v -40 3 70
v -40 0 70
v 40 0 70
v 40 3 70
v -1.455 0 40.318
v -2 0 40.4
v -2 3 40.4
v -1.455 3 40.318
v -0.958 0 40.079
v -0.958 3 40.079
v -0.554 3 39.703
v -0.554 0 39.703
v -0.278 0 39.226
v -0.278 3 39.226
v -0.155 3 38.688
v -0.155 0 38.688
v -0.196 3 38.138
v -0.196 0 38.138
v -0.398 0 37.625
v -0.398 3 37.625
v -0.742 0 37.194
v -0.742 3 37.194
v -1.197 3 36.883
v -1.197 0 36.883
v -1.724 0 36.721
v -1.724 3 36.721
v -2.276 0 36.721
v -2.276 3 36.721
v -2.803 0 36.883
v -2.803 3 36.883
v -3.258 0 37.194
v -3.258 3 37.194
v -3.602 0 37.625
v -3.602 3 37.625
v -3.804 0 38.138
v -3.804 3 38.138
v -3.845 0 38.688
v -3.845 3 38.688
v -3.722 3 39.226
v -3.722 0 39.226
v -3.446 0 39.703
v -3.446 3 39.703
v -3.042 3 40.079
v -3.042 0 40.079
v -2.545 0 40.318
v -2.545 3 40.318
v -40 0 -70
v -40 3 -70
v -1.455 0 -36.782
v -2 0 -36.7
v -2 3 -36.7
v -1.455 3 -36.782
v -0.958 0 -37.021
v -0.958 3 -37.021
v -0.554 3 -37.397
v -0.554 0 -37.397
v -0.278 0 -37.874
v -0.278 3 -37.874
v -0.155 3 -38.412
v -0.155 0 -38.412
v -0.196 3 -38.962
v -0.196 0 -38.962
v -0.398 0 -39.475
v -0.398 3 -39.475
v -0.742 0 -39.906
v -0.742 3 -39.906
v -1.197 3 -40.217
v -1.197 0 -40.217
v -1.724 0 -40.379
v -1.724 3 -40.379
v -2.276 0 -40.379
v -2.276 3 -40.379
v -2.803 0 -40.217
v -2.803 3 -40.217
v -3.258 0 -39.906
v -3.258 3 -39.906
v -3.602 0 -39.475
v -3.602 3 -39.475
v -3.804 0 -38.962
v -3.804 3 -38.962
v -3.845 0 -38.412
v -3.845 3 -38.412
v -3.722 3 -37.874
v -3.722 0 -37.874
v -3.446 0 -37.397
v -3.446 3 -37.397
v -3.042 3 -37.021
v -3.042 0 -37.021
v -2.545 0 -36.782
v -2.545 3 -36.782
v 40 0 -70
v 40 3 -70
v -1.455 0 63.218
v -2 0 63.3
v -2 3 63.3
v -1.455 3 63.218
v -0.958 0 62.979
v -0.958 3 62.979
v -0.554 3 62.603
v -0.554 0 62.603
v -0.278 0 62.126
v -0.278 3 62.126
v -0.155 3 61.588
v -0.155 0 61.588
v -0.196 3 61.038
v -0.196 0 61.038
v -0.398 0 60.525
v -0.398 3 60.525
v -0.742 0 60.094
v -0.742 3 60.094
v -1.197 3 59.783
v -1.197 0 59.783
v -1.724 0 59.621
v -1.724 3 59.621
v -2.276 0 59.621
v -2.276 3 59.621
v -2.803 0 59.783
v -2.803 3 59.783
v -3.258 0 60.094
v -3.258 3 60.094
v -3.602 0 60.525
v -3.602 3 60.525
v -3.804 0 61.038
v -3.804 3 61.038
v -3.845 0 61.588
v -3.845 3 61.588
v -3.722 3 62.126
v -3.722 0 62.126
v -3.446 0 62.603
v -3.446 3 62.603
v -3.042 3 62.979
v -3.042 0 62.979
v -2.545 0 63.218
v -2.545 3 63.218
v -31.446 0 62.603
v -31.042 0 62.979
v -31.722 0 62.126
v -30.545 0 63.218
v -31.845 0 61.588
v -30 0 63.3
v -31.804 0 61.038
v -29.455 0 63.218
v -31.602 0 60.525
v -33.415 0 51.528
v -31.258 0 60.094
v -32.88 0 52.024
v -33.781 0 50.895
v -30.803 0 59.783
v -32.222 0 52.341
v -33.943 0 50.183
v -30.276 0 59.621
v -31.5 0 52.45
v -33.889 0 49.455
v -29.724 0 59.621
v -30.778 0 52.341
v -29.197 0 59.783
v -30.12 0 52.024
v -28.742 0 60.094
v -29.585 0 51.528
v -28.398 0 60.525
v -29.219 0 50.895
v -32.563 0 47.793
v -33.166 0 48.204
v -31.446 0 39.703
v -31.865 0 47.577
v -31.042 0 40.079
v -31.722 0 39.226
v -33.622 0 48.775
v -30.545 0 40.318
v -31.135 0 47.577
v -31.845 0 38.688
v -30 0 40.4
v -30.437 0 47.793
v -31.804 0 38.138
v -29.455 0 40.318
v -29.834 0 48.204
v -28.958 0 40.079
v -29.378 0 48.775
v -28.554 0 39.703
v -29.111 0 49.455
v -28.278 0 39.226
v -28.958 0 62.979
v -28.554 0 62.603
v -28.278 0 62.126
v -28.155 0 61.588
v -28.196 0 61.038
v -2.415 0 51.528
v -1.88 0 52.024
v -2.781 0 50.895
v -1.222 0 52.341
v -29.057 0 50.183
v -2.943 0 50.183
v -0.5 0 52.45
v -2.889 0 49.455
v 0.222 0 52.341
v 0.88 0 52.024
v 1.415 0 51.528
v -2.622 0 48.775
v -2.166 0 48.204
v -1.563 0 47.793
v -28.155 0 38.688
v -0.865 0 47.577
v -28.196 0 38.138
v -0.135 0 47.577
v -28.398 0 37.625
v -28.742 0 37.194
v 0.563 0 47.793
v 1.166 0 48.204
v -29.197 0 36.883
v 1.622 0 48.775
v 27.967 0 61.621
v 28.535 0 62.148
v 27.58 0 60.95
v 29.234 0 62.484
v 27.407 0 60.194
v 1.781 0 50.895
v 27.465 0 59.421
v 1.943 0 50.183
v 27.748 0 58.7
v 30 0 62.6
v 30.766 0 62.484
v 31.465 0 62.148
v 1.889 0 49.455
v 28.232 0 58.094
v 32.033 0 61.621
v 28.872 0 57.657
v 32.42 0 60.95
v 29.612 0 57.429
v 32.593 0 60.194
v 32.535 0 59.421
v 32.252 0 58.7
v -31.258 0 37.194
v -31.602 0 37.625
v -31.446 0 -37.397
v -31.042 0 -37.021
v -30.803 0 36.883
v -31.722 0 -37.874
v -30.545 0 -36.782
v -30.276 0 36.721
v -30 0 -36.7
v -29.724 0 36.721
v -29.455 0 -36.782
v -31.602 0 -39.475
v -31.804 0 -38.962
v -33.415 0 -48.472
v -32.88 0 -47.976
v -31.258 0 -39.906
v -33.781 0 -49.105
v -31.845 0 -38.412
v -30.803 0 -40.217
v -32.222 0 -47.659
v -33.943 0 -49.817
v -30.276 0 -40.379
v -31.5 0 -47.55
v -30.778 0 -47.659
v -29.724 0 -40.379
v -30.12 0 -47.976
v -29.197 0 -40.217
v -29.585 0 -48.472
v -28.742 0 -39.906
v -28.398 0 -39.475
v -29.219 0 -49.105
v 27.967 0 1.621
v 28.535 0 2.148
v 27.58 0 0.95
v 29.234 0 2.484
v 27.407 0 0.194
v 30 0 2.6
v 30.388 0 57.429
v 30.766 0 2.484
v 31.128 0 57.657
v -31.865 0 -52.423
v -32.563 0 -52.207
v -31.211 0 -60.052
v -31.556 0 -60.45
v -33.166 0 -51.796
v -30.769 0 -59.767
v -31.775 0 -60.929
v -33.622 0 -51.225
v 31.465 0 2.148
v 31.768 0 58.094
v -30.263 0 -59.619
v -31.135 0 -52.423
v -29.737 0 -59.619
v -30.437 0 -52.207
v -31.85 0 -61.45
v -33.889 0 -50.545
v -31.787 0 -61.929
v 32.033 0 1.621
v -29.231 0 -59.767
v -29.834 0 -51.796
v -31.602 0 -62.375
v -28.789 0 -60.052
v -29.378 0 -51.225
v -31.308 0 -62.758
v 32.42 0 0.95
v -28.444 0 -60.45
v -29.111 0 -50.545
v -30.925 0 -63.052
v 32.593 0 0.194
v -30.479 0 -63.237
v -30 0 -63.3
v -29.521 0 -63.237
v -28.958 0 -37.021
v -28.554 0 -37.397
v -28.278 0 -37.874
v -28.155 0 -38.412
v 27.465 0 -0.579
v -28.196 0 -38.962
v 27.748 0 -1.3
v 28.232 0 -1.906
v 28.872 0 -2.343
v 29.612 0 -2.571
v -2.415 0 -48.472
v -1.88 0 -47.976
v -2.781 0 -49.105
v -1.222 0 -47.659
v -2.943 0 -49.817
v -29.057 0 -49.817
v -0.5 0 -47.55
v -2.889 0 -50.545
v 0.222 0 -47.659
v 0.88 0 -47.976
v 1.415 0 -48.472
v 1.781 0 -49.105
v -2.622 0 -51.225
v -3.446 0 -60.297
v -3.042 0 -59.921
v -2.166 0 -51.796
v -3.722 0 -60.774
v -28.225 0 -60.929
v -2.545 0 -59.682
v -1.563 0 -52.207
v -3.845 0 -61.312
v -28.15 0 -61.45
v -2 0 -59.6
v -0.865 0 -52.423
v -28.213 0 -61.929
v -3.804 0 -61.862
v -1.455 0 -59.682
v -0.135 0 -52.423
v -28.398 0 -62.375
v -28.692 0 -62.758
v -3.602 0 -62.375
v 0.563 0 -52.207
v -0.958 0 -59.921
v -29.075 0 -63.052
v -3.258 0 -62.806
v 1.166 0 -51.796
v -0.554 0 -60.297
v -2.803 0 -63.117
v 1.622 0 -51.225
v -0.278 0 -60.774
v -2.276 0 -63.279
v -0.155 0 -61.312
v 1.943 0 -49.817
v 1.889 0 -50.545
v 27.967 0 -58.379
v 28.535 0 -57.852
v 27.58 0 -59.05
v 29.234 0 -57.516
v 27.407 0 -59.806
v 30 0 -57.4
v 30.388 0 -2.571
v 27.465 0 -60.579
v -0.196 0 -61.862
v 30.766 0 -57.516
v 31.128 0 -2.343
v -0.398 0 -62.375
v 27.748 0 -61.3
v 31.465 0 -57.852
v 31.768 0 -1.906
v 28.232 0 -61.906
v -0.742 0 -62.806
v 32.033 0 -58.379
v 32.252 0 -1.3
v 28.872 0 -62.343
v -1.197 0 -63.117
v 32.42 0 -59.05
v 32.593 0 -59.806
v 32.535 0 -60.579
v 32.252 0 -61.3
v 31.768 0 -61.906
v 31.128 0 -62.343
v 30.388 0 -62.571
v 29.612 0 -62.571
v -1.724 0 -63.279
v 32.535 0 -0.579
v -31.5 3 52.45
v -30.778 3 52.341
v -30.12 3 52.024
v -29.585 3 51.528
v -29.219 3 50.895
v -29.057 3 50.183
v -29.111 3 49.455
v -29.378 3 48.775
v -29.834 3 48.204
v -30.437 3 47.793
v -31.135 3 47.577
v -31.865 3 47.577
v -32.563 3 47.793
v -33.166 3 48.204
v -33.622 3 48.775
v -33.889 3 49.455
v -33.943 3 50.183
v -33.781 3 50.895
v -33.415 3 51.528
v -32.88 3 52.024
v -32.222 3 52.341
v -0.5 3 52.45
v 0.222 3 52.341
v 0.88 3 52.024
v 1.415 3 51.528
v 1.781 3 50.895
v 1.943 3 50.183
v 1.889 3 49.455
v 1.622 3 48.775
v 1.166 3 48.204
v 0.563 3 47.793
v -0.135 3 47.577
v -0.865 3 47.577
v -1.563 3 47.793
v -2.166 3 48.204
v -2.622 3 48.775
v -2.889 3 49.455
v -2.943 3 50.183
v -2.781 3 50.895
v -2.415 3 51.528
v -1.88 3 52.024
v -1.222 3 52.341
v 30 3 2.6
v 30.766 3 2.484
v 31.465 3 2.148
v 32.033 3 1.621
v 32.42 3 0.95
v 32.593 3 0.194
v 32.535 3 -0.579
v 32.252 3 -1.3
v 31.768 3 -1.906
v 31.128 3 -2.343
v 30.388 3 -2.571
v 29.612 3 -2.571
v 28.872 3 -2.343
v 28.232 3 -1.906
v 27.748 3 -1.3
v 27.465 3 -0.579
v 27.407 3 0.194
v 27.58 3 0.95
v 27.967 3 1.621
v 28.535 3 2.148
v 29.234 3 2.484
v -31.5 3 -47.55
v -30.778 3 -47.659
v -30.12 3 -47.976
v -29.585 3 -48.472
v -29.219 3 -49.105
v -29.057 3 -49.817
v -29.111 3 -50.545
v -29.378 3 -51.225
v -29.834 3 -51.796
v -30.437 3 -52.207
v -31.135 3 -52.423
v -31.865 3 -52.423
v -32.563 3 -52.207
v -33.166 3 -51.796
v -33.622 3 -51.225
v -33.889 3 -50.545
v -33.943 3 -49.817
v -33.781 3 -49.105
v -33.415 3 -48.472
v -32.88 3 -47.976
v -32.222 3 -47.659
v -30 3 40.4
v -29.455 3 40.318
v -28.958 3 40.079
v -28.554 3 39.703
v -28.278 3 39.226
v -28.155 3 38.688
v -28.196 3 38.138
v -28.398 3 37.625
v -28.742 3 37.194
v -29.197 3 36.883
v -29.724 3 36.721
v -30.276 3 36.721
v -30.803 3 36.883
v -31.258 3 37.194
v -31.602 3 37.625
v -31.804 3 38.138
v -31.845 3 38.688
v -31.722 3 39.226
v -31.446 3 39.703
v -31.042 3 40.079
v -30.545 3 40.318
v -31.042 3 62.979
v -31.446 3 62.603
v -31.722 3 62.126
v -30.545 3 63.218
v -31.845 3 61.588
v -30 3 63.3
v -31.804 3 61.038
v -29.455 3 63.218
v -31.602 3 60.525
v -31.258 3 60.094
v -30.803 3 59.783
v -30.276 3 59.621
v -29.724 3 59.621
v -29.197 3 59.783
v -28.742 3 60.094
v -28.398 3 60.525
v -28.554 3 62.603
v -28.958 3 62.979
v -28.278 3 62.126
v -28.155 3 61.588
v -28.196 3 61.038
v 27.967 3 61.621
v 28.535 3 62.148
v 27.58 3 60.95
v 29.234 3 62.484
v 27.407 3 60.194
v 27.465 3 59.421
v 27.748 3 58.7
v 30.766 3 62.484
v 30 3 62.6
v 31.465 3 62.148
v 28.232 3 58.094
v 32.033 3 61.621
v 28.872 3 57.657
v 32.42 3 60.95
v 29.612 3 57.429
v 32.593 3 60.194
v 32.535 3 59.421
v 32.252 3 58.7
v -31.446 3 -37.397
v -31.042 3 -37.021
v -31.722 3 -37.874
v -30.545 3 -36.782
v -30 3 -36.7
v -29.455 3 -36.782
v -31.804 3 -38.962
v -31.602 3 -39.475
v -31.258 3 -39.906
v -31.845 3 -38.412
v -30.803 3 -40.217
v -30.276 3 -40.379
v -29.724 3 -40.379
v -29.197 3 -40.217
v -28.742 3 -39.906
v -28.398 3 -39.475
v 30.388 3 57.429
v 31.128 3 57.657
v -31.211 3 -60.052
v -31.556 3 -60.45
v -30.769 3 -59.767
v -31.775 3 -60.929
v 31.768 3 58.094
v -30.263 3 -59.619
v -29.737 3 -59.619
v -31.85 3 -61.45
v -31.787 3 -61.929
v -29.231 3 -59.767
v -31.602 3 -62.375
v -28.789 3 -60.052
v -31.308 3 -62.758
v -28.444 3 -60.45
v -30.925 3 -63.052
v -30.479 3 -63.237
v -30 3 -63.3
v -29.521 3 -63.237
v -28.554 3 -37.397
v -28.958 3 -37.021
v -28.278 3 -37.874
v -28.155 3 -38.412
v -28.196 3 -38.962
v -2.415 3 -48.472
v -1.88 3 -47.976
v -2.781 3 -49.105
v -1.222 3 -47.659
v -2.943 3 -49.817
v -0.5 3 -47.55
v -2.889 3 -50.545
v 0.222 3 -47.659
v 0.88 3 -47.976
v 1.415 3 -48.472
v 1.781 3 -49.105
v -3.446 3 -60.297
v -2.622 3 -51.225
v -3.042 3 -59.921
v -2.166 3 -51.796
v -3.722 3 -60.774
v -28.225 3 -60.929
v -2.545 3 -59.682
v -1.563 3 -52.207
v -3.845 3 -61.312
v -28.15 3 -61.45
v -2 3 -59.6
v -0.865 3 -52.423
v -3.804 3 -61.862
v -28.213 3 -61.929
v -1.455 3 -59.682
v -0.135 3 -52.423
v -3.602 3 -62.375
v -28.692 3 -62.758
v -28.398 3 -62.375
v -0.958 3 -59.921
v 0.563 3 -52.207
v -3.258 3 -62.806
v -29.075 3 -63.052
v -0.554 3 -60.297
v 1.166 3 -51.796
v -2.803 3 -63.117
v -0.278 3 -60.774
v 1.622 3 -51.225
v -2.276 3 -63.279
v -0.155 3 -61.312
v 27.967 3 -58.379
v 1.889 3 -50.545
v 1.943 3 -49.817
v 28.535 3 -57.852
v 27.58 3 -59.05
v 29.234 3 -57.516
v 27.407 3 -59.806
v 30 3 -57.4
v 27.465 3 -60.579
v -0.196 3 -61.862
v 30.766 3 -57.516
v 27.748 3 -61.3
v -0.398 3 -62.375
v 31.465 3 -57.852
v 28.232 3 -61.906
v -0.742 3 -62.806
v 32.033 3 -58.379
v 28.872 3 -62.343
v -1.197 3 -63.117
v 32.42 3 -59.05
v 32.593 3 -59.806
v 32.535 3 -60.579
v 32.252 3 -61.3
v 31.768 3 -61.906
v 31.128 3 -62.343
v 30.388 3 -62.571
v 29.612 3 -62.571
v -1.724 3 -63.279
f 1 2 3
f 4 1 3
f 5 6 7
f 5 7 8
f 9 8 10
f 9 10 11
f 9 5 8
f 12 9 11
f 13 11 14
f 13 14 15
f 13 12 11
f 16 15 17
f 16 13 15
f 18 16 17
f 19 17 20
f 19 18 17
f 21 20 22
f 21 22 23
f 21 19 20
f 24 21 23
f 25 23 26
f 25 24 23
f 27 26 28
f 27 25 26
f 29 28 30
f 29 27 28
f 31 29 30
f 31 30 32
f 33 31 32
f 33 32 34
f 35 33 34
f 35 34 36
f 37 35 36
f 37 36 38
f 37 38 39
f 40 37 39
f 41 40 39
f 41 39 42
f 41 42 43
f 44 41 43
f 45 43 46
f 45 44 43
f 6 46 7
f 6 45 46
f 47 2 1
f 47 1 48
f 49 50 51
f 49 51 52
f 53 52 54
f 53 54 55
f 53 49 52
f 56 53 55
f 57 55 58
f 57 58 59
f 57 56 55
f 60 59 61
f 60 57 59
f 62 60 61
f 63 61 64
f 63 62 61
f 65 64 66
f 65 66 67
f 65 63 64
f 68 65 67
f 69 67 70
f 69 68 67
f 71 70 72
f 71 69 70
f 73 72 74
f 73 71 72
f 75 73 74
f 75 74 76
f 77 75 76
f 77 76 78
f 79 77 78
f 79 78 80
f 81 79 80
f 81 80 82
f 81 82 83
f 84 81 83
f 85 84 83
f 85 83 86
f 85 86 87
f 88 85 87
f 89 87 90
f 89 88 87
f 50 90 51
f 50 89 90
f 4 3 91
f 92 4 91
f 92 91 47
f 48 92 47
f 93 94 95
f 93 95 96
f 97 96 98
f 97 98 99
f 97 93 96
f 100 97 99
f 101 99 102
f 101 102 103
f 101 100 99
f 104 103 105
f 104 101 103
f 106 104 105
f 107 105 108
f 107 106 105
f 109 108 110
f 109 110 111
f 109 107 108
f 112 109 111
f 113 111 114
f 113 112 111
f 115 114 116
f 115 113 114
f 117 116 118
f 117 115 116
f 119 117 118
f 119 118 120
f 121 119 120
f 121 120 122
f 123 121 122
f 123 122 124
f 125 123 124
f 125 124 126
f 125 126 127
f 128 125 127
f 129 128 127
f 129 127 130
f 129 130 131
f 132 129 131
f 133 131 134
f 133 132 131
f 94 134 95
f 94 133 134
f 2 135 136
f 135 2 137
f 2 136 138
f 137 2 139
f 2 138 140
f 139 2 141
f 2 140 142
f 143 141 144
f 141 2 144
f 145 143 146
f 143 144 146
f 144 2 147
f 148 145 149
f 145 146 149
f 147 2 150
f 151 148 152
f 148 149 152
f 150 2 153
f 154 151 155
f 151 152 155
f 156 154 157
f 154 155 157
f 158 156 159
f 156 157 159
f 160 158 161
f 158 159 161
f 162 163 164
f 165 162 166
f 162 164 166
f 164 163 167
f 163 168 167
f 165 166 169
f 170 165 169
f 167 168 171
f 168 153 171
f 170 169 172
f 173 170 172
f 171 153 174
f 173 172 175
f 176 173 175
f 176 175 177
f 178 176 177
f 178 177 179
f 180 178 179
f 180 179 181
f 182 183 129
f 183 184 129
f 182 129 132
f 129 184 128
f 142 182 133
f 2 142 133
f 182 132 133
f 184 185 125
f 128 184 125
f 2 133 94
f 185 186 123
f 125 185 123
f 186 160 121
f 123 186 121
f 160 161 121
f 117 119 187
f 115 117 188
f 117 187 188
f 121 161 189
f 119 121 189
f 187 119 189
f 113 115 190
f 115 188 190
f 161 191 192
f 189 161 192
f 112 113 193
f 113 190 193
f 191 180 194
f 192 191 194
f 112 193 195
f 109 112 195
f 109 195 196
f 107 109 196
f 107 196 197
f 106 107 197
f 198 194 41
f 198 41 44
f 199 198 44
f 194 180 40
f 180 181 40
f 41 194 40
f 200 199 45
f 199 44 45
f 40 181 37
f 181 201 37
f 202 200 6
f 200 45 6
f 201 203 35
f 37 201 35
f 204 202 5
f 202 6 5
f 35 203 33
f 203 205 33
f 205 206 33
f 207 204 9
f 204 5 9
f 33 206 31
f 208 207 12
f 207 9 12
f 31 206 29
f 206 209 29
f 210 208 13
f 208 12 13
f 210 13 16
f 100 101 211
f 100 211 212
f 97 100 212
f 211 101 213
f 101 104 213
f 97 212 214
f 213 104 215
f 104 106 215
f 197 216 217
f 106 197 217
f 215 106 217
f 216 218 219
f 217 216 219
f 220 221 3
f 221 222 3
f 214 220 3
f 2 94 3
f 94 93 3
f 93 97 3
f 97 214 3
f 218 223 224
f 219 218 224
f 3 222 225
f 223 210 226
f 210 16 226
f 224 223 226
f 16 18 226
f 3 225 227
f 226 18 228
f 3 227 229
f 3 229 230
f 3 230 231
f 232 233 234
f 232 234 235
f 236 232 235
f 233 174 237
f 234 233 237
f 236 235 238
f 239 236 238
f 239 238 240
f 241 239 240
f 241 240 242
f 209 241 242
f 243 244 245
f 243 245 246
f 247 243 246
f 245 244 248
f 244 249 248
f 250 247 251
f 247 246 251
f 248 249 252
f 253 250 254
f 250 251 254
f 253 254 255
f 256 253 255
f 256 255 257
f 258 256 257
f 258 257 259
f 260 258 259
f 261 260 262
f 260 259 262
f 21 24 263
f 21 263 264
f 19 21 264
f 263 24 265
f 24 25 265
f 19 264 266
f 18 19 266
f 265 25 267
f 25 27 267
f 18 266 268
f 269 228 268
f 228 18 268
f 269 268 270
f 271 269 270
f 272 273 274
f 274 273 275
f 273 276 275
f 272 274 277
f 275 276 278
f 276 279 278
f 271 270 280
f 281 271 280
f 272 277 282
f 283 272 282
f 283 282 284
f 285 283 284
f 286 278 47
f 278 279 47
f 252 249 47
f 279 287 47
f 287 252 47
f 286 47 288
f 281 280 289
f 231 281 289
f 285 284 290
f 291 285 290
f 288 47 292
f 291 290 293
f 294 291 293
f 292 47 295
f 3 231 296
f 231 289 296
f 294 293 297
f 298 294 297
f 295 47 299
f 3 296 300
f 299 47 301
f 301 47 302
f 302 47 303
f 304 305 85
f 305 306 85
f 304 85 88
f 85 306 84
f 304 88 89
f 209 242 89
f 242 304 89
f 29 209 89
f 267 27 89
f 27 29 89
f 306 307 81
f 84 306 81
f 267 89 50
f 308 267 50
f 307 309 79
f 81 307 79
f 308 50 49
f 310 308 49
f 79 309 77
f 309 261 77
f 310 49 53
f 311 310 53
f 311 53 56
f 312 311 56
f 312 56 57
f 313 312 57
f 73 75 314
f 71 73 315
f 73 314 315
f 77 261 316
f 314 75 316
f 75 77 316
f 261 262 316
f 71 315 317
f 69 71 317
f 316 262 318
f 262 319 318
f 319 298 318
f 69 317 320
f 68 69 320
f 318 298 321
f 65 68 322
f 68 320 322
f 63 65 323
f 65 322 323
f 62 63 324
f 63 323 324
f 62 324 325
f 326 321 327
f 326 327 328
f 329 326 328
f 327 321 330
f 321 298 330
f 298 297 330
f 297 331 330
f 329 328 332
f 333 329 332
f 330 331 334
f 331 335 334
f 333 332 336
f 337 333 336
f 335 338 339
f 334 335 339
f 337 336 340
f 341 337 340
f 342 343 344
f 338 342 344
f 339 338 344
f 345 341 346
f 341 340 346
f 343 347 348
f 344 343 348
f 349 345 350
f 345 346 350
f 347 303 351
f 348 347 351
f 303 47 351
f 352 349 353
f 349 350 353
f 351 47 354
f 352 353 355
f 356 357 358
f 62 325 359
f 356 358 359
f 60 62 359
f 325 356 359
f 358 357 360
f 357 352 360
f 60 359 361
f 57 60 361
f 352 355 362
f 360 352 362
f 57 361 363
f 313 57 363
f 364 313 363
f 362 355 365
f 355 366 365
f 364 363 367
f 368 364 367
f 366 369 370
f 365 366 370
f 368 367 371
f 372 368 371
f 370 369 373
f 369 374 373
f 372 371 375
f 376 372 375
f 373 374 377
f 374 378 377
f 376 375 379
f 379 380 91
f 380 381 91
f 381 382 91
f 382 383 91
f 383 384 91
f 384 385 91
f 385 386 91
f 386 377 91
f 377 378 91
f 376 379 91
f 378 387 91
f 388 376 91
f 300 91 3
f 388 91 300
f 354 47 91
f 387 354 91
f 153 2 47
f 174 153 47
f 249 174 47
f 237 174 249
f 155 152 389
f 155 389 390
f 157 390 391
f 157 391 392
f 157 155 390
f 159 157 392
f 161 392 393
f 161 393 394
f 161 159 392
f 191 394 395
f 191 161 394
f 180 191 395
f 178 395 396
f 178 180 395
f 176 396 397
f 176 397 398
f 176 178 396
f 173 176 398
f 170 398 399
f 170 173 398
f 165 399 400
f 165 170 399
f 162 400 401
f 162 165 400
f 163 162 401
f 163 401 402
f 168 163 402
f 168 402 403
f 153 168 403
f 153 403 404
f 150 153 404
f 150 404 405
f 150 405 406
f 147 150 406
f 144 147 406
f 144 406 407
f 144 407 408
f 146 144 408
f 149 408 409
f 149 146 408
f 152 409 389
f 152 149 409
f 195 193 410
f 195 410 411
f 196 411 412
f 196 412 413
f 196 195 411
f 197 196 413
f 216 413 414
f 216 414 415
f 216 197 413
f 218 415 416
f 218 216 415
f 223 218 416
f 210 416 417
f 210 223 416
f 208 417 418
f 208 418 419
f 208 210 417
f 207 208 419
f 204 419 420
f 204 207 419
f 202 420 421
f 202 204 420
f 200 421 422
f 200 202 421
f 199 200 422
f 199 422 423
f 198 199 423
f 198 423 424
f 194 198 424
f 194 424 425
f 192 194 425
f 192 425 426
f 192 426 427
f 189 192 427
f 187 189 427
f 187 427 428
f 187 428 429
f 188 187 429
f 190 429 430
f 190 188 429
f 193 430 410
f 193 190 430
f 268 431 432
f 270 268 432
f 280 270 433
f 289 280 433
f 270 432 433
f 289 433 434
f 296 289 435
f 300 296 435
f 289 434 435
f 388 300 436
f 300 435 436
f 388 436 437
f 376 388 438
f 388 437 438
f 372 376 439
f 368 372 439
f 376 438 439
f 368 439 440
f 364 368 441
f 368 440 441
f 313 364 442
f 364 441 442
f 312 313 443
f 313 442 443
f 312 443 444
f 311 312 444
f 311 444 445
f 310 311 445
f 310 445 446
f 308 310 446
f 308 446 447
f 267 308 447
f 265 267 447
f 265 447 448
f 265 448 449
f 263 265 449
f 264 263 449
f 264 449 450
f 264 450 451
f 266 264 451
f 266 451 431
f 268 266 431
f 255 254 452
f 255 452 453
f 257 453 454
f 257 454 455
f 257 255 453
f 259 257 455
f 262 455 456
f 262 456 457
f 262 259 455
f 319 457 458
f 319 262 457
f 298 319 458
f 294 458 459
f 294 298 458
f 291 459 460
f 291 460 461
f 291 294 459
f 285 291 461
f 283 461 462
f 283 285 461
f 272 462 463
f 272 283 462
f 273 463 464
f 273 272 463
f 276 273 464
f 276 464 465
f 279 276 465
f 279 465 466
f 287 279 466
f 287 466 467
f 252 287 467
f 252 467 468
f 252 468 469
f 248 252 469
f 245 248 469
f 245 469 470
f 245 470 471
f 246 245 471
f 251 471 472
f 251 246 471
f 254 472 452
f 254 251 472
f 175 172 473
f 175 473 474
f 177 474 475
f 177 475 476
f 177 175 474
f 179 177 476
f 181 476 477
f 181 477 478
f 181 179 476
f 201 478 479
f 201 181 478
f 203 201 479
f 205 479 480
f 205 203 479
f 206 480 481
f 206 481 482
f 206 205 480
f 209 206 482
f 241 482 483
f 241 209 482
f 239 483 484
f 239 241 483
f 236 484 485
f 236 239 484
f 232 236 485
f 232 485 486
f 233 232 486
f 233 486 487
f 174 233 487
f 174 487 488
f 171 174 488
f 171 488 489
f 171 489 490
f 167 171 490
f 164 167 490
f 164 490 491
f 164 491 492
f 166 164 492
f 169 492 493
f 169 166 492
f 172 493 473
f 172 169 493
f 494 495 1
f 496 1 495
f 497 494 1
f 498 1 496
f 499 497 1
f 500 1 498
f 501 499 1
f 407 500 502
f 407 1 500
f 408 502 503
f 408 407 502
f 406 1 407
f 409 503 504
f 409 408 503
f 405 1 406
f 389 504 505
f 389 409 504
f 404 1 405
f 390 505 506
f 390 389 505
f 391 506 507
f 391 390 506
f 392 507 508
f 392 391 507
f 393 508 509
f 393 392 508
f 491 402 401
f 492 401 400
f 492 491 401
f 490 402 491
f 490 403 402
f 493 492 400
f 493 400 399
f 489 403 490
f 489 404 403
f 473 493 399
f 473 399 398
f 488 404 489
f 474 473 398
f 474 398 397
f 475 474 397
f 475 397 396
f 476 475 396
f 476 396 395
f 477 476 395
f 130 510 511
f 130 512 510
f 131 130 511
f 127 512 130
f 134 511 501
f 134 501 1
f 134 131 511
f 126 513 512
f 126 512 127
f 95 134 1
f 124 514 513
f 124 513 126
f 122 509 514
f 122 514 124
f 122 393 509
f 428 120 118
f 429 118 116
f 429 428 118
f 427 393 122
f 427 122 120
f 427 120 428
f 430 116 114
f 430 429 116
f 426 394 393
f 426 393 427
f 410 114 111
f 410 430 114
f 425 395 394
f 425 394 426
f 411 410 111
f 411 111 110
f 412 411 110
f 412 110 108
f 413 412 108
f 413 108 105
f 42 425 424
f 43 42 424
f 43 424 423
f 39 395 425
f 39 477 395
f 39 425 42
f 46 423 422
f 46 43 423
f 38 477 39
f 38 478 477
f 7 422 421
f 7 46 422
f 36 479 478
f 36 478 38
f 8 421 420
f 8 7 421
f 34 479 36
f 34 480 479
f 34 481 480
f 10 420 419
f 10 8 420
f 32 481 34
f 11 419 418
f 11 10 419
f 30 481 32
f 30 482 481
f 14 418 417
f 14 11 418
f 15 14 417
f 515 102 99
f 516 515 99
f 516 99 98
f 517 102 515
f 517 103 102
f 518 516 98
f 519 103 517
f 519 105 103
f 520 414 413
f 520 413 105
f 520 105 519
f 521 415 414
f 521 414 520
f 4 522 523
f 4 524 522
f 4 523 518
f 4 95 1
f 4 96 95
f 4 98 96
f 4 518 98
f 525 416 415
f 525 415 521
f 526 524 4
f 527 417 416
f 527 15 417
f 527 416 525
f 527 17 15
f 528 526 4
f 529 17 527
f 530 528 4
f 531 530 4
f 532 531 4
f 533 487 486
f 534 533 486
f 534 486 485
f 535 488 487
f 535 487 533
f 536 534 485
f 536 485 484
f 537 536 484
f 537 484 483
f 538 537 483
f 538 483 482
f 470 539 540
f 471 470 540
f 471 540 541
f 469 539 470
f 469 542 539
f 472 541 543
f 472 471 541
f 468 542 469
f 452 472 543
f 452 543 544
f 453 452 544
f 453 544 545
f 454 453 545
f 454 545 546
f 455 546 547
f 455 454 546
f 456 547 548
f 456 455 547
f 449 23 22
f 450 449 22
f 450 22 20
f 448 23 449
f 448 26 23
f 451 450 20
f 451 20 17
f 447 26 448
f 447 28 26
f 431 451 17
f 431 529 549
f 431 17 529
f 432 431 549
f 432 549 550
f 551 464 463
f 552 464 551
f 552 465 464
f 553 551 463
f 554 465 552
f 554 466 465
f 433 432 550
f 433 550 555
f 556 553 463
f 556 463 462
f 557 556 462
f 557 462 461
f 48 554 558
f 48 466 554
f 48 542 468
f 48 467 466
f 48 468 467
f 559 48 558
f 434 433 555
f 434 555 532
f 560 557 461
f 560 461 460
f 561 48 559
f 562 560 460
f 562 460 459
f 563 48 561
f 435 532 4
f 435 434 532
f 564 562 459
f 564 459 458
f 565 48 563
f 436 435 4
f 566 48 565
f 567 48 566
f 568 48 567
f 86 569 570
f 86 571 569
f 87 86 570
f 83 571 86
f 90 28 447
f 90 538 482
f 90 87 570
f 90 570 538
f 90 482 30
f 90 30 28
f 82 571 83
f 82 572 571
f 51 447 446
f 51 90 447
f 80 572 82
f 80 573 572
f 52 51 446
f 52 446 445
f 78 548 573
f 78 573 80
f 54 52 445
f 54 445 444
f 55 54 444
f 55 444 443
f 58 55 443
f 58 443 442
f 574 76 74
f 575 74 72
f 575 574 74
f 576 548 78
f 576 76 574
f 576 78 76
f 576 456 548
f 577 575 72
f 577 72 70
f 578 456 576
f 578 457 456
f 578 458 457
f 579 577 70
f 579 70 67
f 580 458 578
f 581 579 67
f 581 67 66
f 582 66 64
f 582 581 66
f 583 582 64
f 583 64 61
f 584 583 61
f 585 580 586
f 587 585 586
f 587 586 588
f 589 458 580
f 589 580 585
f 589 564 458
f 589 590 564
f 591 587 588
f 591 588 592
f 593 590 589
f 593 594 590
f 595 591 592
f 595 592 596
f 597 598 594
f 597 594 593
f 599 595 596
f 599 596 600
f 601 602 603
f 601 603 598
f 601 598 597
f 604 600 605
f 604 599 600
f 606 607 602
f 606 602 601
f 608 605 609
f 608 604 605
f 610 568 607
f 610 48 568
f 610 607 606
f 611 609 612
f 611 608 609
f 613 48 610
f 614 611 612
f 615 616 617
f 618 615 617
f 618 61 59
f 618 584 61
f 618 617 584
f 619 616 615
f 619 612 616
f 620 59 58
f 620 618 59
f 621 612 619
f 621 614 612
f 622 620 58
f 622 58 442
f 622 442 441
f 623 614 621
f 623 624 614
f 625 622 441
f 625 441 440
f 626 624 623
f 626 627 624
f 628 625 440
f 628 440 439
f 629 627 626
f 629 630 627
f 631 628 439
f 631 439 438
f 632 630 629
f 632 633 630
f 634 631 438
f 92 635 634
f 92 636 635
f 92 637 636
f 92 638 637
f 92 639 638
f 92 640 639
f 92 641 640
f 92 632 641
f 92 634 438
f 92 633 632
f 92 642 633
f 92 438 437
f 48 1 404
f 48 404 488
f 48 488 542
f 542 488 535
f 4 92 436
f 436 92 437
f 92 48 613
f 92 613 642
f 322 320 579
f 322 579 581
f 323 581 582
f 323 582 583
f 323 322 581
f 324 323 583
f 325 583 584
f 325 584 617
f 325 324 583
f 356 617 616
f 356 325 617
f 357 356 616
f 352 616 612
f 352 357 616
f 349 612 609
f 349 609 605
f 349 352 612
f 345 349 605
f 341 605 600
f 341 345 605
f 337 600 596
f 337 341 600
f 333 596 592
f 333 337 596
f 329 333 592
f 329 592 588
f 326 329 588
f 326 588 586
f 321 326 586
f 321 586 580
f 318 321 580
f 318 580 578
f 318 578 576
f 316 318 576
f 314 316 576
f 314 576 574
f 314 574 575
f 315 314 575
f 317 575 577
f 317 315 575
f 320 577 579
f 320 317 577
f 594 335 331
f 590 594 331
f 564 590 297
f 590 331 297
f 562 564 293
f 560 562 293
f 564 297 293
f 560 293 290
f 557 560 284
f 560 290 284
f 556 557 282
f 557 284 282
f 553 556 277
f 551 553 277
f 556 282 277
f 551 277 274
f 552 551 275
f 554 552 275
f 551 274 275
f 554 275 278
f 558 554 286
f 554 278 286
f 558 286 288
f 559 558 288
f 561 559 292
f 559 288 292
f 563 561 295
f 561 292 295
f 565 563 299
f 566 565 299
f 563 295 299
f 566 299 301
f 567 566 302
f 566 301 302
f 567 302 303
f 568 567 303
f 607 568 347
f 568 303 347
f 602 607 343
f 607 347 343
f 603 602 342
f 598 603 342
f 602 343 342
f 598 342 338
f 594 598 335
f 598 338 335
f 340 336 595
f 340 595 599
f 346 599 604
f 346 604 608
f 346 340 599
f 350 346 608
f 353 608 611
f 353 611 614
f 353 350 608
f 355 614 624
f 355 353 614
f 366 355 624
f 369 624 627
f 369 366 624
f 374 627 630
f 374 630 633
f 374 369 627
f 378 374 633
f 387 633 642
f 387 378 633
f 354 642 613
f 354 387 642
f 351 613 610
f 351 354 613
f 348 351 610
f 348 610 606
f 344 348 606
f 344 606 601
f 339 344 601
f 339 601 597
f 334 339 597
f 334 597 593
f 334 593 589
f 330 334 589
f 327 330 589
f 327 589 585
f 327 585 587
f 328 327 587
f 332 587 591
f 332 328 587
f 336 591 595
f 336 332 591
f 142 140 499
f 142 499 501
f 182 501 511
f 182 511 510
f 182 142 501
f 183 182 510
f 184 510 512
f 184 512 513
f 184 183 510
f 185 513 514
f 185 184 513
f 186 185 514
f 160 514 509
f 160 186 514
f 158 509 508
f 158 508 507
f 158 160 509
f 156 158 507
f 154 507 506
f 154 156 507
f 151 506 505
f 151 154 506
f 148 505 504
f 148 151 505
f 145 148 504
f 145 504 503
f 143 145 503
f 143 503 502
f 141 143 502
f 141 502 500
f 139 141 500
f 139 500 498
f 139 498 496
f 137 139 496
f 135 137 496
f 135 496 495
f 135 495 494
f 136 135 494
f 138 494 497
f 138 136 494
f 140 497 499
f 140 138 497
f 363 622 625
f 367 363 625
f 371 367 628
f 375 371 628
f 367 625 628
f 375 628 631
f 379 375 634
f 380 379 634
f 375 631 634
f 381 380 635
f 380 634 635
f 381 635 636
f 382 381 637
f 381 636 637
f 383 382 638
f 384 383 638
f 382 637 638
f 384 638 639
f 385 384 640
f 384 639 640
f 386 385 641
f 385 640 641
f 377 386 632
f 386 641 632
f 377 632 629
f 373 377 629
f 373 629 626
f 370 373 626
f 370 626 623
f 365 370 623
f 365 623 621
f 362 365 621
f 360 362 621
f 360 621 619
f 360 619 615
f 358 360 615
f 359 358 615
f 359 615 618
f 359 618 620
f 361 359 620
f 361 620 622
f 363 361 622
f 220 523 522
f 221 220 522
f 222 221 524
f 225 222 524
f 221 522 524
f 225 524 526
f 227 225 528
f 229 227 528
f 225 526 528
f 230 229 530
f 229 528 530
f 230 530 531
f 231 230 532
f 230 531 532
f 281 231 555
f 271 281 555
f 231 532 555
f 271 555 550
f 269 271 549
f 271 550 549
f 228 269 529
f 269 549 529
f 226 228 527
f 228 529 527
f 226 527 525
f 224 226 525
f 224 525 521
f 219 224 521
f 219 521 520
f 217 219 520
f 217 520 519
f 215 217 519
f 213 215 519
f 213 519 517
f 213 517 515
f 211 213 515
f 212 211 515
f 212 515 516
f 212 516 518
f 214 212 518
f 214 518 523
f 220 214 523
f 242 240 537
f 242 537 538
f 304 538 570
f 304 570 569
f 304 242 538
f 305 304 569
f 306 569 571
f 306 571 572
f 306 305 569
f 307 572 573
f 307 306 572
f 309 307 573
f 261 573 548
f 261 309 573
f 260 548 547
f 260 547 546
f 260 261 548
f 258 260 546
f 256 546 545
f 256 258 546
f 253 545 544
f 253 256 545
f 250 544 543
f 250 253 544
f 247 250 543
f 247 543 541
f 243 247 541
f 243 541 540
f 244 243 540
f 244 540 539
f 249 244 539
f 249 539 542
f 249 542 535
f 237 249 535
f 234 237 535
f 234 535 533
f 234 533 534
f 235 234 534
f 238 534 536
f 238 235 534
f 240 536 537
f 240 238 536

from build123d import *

# Parameters (mm, degrees)
SKETCH_1_R          = 2.5
SKETCH_1_R_2        = 2.45
SKETCH_1_R_3        = 1.85
SKETCH_1_W          = 48
SKETCH_1_H          = 40
EXTRUDE_1_DEPTH     = 3
SKETCH_2_R          = 2.6
CUT_EXTRUDE_1_DEPTH = 10


with BuildPart() as part:
    # 草图1 → 凸台-拉伸1 (new body)
    # profile 1 of 5: a face of its own
    with BuildSketch(Plane(origin=(0, 0, 0), x_dir=(1, 0, 0), z_dir=(0, 1, 0))):
        with BuildLine():
            Line((8, -30), (8, -70))
            Line((8, -70), (40, -70))
            Line((40, -70), (40, 60))
            Line((40, 60), (32.5, 60))
            ThreePointArc((32.5, 60), (28.232233047, 58.232233047), (30, 62.5))
            Line((30, 62.5), (30, 70))
            Line((30, 70), (8, 70))
            Line((8, 70), (8, 30))
            Line((8, 30), (-40, 30))
            Line((-40, 30), (-40, -30))
            Line((-40, -30), (8, -30))
        make_face()
        with Locations(Location((30, -60, 0), (0, 0, 270))):
            Circle(SKETCH_1_R, mode=Mode.SUBTRACT)
        with Locations(Location((30, 0, 0), (0, 0, 270))):
            Circle(SKETCH_1_R, mode=Mode.SUBTRACT)
    # profile 2 of 5: a face of its own
    with BuildSketch(Plane(origin=(0, 0, 0), x_dir=(1, 0, 0), z_dir=(0, 1, 0))):
        with BuildLine():
            Line((32.5, 60), (40, 60))
            Line((40, 60), (40, 70))
            Line((40, 70), (30, 70))
            Line((30, 70), (30, 62.5))
            ThreePointArc((30, 62.5), (31.767766953, 61.767766953), (32.5, 60))
        make_face()
    # profile 3 of 5: a face of its own
    with BuildSketch(Plane(origin=(0, 0, 0), x_dir=(1, 0, 0), z_dir=(0, 1, 0))):
        with BuildLine():
            Line((-40, 61.45), (-40, 30))
            Line((-40, 30), (8, 30))
            Line((8, 30), (8, 70))
            Line((8, 70), (-30, 70))
            Line((-30, 70), (-30, 63.3))
            ThreePointArc((-30, 63.3), (-28.691852455, 62.758147545), (-28.15, 61.45))
            ThreePointArc((-28.15, 61.45), (-30, 59.6), (-31.85, 61.45))
            Line((-31.85, 61.45), (-40, 61.45))
        make_face()
        with Locations(Location((-31.5, 50, 0), (0, 0, 270))):
            Circle(SKETCH_1_R_2, mode=Mode.SUBTRACT)
        with Locations(Location((-30, 38.55, 0), (0, 0, 270))):
            Circle(SKETCH_1_R_3, mode=Mode.SUBTRACT)
        with Locations(Location((-2, 38.55, 0), (0, 0, 270))):
            Circle(SKETCH_1_R_3, mode=Mode.SUBTRACT)
        with Locations(Location((-0.5, 50, 0), (0, 0, 270))):
            Circle(SKETCH_1_R_2, mode=Mode.SUBTRACT)
        with Locations(Location((-2, 61.45, 0), (0, 0, 270))):
            Circle(SKETCH_1_R_3, mode=Mode.SUBTRACT)
    # profile 4 of 5: a face of its own
    with BuildSketch(Plane(origin=(0, 0, 0), x_dir=(1, 0, 0), z_dir=(0, 1, 0))):
        with BuildLine():
            Line((-40, 70), (-40, 61.45))
            Line((-40, 61.45), (-31.85, 61.45))
            ThreePointArc((-31.85, 61.45), (-31.308147545, 62.758147545), (-30, 63.3))
            Line((-30, 63.3), (-30, 70))
            Line((-30, 70), (-40, 70))
        make_face()
    # profile 5 of 5: a face of its own
    with BuildSketch(Plane(origin=(0, 0, 0), x_dir=(1, 0, 0), z_dir=(0, 1, 0))):
        with Locations((-16, -50)):
            Rectangle(SKETCH_1_W, SKETCH_1_H)
        with Locations(Location((-30, -61.45, 0), (0, 0, 270))):
            Circle(SKETCH_1_R_3, mode=Mode.SUBTRACT)
        with Locations(Location((-31.5, -50, 0), (0, 0, 270))):
            Circle(SKETCH_1_R_2, mode=Mode.SUBTRACT)
        with Locations(Location((-30, -38.55, 0), (0, 0, 270))):
            Circle(SKETCH_1_R_3, mode=Mode.SUBTRACT)
        with Locations(Location((-2, -61.45, 0), (0, 0, 270))):
            Circle(SKETCH_1_R_3, mode=Mode.SUBTRACT)
        with Locations(Location((-0.5, -50, 0), (0, 0, 270))):
            Circle(SKETCH_1_R_2, mode=Mode.SUBTRACT)
        with Locations(Location((-2, -38.55, 0), (0, 0, 270))):
            Circle(SKETCH_1_R_3, mode=Mode.SUBTRACT)
    extrude(amount=EXTRUDE_1_DEPTH)

    # 草图2 → 切除-拉伸1 (cut)
    with BuildSketch(Plane(origin=(0, 3, 0), x_dir=(1, 0, 0), z_dir=(0, 1, 0))):
        with Locations(Location((30, 60, 0), (0, 0, 270))):
            Circle(SKETCH_2_R)
        with Locations(Location((30, 0, 0), (0, 0, 270))):
            Circle(SKETCH_2_R)
        with Locations(Location((30, -60, 0), (0, 0, 270))):
            Circle(SKETCH_2_R)
    extrude(amount=-CUT_EXTRUDE_1_DEPTH, mode=Mode.SUBTRACT)


solid = part.part
